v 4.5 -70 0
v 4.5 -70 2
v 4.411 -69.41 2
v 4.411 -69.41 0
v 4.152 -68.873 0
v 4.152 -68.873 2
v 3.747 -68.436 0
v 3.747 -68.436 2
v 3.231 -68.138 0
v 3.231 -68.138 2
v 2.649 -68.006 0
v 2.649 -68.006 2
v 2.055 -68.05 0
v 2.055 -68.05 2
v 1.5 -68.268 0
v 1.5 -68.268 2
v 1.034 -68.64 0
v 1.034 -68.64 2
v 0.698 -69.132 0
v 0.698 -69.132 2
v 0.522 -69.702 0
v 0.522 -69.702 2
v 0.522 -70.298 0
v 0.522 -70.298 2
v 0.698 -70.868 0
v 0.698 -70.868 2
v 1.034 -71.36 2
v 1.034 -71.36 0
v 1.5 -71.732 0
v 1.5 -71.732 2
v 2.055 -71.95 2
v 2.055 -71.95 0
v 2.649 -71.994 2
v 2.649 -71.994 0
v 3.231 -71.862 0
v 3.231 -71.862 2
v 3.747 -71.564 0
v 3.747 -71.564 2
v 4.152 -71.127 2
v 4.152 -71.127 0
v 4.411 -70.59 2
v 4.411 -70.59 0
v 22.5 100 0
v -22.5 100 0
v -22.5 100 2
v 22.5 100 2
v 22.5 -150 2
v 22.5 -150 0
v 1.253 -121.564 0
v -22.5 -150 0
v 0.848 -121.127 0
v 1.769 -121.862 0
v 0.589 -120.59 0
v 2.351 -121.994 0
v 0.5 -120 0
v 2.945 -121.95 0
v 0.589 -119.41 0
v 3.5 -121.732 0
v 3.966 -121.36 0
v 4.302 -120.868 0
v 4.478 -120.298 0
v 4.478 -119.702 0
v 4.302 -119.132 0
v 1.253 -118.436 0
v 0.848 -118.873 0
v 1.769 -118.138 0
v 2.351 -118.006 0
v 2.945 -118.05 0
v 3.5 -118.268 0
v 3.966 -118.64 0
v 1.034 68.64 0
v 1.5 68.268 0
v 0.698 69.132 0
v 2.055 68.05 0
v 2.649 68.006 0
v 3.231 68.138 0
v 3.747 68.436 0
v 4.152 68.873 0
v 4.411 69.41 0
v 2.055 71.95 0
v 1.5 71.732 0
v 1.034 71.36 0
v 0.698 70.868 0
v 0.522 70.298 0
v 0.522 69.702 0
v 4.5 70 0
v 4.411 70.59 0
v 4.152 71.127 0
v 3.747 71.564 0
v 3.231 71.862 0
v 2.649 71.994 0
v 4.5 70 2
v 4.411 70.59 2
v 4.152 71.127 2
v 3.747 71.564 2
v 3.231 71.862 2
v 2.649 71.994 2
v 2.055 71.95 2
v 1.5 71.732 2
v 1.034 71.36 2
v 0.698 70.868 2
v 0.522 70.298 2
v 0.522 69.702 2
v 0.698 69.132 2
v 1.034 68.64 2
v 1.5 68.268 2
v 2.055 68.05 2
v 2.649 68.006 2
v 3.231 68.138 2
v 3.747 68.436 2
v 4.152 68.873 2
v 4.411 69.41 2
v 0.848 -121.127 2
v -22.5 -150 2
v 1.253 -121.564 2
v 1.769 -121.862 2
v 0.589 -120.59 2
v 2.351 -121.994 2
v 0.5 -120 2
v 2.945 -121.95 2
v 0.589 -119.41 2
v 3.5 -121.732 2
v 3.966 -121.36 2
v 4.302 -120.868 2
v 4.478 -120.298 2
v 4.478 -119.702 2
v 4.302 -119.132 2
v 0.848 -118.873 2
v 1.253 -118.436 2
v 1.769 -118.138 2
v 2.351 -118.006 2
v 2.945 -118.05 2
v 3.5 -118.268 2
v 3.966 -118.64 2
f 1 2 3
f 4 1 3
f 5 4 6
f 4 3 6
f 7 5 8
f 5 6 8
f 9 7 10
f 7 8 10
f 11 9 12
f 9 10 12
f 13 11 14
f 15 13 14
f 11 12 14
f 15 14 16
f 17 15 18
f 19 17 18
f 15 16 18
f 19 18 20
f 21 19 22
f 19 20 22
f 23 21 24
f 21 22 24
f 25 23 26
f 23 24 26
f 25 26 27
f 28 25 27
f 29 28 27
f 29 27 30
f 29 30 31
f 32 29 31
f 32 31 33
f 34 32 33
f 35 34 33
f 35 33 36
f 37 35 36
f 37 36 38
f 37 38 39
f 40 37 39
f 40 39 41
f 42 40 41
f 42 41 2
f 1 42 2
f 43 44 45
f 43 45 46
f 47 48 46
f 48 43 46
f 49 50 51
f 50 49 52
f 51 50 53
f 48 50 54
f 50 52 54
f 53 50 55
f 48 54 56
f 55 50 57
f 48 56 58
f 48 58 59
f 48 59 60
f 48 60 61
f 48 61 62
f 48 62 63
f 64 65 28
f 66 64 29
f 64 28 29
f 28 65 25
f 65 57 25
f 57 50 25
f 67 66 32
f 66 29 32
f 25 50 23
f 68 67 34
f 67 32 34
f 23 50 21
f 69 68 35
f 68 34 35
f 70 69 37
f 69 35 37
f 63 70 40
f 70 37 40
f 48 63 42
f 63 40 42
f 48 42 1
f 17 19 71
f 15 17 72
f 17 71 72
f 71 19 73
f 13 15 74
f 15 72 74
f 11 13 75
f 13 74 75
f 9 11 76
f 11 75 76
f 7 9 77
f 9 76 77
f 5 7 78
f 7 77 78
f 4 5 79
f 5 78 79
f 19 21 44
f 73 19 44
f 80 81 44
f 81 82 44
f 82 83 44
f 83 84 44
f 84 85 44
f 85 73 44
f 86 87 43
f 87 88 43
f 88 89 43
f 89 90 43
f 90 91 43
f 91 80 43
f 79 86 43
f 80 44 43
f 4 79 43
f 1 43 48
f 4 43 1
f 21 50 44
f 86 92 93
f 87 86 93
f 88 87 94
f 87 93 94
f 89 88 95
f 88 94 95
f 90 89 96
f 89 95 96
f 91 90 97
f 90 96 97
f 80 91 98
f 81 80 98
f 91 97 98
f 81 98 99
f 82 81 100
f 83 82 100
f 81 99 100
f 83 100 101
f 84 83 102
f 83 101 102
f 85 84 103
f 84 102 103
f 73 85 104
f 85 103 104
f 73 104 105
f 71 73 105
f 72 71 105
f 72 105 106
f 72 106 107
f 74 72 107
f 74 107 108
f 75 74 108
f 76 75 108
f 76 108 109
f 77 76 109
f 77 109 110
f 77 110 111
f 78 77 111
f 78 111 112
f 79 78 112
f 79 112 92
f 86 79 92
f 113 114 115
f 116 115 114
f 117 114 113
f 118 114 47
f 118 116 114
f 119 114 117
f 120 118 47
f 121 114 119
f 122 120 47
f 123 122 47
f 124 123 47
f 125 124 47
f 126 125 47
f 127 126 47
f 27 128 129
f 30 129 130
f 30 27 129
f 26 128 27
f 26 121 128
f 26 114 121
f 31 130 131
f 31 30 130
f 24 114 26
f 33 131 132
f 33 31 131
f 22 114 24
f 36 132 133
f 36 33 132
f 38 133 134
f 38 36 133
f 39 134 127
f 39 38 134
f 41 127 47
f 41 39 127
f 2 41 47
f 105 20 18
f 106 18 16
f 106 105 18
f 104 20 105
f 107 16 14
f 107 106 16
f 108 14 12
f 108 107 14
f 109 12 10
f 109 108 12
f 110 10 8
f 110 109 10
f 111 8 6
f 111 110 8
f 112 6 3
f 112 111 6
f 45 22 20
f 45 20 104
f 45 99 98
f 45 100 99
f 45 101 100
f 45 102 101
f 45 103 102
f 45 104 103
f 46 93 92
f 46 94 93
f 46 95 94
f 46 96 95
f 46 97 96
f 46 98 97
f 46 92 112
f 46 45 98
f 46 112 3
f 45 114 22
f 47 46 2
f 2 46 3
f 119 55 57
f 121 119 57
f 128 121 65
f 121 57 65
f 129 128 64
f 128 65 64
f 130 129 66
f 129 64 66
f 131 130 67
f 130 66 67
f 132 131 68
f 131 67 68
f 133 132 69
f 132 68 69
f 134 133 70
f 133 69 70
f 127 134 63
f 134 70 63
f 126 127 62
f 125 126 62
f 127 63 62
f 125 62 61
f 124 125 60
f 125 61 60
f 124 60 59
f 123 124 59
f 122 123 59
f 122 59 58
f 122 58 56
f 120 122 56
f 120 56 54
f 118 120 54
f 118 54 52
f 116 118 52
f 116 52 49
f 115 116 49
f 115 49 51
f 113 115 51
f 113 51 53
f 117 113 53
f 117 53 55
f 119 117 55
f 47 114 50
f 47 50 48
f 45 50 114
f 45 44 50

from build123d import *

# Parameters (mm, degrees)
SKETCH1_W           = 45
SKETCH1_H           = 200
BOSS_EXTRUDE1_DEPTH = 2
SKETCH2_R           = 2
CUT_EXTRUDE1_DEPTH  = 103.519510338
SKETCH5_W           = 45
SKETCH5_H           = 2
BOSS_EXTRUDE3_DEPTH = 50
SKETCH6_R           = 2
CUT_EXTRUDE3_DEPTH  = 50


with BuildPart() as part:
    # Sketch1 → Boss-Extrude1 (new body)
    with BuildSketch(Plane.XY):
        Rectangle(SKETCH1_W, SKETCH1_H)
    extrude(amount=BOSS_EXTRUDE1_DEPTH)

    # Sketch2 → Cut-Extrude1 (cut, through all)
    with BuildSketch(Plane.XY.offset(2)):
        with Locations((2.5, -70)):
            Circle(SKETCH2_R)
        with Locations((2.5, 70)):
            Circle(SKETCH2_R)
    extrude(amount=-CUT_EXTRUDE1_DEPTH, mode=Mode.SUBTRACT)

    # Sketch5 → Boss-Extrude3 (add)
    with BuildSketch(Plane.XZ.offset(100)):
        with Locations((0, 1)):
            Rectangle(SKETCH5_W, SKETCH5_H)
    extrude(amount=BOSS_EXTRUDE3_DEPTH)

    # Sketch6 → Cut-Extrude3 (cut)
    with BuildSketch(Plane(origin=(0, 0, 0), x_dir=(-1, 0, 0), z_dir=(0, 0, -1))):
        with Locations((-2.5, -120)):
            Circle(SKETCH6_R)
    extrude(amount=-CUT_EXTRUDE3_DEPTH, mode=Mode.SUBTRACT)


solid = part.part
